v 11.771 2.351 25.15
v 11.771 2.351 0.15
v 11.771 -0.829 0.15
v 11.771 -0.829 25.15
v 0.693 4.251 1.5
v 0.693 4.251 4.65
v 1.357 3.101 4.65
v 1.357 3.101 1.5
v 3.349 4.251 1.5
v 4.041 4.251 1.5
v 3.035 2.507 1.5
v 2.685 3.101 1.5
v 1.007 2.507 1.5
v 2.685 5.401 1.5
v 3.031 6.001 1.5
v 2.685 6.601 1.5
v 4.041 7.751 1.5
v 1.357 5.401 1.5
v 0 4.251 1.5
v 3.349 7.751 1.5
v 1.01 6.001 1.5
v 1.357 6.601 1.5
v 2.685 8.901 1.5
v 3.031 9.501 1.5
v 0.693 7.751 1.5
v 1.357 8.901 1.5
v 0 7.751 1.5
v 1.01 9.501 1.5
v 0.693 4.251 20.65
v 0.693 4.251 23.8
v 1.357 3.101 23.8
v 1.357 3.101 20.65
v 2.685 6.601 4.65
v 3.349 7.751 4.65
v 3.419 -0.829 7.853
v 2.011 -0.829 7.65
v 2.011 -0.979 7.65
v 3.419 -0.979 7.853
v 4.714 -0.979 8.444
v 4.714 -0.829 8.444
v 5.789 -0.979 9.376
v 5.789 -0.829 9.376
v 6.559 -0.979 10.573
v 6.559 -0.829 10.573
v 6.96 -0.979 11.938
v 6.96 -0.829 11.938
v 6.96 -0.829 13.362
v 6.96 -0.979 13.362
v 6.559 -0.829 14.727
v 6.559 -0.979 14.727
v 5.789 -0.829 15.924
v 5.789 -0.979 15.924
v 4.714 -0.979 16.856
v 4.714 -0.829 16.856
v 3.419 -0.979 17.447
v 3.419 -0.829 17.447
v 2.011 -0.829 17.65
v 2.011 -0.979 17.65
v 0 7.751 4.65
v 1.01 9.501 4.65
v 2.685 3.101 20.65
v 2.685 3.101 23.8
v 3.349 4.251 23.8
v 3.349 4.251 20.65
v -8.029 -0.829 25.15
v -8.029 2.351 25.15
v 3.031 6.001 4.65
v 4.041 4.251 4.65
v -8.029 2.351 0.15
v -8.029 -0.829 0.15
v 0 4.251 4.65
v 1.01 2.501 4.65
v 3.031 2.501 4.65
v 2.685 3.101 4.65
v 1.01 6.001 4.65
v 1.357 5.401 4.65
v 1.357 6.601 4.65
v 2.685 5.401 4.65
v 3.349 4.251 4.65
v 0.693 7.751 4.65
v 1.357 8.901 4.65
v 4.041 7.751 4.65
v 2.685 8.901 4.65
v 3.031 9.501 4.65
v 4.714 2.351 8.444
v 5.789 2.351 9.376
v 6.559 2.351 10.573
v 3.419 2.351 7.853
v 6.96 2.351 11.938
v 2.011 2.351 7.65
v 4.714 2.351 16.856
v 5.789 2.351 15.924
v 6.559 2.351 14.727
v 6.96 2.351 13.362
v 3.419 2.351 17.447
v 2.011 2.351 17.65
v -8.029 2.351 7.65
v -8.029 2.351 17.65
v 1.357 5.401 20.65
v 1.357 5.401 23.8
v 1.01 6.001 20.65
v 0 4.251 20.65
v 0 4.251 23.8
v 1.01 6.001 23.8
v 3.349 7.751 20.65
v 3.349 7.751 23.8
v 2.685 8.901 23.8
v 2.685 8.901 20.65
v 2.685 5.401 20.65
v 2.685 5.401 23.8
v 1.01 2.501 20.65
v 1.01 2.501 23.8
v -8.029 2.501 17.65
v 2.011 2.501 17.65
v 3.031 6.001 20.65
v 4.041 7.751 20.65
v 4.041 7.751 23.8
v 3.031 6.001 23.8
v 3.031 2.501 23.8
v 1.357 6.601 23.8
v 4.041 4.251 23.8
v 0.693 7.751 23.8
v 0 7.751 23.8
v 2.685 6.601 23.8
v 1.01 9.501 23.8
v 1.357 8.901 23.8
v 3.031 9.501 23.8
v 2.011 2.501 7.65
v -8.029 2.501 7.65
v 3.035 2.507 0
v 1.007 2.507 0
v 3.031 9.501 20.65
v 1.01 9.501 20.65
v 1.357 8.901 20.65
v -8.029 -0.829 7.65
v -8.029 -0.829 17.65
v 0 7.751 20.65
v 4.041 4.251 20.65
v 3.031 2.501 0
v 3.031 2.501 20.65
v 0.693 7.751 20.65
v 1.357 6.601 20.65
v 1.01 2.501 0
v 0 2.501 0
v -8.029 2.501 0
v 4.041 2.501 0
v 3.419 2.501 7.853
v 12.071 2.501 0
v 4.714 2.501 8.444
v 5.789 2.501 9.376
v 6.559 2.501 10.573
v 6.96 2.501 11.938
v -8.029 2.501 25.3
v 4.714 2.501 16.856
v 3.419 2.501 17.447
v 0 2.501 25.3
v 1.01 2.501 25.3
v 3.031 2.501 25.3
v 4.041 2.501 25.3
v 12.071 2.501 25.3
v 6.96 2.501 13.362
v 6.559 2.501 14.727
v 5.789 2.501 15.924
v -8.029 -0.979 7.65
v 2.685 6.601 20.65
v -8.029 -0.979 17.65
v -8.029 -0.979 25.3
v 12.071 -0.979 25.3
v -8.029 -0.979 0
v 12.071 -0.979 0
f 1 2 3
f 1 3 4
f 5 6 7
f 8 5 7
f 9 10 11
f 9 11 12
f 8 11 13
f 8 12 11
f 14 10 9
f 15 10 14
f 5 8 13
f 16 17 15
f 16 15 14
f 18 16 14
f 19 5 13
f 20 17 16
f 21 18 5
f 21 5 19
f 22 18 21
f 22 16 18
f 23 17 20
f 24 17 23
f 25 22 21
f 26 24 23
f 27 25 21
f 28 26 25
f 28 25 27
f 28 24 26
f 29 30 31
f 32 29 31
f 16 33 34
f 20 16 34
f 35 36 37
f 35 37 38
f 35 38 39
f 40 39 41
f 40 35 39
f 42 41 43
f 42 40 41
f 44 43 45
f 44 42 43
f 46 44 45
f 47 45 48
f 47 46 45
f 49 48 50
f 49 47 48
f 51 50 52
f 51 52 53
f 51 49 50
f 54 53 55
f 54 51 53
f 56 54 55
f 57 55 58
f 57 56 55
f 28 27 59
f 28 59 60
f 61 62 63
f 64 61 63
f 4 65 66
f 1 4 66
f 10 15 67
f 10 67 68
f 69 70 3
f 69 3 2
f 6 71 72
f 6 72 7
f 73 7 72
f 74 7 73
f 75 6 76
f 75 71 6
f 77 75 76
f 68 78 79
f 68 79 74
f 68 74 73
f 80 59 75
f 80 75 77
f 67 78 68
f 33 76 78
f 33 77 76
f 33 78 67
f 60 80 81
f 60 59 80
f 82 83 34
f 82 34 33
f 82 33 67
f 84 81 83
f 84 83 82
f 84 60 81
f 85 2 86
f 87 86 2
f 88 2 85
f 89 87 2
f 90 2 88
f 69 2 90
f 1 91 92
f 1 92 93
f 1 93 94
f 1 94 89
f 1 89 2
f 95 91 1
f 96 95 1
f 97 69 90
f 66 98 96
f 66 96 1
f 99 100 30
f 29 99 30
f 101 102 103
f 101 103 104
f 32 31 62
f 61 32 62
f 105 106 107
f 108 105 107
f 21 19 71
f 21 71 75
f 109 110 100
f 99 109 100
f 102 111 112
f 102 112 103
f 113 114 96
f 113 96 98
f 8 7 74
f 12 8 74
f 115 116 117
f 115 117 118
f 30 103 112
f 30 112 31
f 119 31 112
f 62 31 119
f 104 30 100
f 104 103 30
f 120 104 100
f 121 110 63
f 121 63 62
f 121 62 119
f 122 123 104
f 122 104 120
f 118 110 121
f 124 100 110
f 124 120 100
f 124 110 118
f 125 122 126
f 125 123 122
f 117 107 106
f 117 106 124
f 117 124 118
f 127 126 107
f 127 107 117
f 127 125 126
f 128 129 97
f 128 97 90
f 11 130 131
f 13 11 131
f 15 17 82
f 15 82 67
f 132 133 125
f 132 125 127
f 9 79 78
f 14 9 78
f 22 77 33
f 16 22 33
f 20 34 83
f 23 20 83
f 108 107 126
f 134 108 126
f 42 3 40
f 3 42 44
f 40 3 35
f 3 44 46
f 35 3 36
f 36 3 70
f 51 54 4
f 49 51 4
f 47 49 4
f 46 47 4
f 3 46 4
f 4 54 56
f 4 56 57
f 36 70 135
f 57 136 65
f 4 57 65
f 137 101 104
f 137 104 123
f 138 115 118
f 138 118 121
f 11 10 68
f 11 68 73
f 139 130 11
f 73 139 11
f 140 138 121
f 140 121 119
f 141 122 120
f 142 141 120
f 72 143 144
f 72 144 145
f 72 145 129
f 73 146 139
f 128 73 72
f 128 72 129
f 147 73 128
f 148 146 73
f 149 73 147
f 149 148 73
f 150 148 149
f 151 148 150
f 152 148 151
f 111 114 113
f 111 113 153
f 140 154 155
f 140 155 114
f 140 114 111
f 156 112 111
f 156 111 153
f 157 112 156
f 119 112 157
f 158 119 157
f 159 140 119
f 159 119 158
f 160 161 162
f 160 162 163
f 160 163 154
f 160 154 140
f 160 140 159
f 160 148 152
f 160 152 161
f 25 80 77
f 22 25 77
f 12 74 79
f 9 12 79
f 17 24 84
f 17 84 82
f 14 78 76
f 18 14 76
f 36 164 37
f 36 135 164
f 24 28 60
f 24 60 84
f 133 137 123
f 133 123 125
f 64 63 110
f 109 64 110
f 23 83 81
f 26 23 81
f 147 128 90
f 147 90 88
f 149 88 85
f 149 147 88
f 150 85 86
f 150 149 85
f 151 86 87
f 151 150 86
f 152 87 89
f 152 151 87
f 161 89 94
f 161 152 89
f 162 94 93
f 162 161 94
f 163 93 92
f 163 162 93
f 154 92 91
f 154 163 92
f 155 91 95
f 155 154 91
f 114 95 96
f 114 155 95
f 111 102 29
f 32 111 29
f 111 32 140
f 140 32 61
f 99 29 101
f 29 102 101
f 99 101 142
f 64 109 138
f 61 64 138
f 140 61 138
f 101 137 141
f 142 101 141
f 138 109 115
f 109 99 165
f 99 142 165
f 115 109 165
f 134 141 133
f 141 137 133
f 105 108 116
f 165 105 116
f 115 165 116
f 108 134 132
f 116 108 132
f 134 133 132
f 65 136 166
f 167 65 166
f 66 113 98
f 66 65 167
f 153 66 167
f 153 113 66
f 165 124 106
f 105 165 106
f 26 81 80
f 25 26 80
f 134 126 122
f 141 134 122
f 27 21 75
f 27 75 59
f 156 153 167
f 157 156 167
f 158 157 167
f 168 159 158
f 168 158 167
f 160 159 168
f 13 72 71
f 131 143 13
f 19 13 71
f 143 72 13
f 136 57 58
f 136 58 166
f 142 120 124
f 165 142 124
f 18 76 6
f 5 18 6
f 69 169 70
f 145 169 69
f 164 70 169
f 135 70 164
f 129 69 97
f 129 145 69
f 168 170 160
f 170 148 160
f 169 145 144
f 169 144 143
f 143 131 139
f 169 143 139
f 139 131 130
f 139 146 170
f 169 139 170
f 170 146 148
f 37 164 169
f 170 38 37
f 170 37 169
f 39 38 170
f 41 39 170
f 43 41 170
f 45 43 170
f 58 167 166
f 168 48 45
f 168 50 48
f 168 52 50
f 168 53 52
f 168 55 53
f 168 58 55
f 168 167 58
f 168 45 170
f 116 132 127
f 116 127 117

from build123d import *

# Parameters (mm, degrees)
BOSS_EXTRUDE1_DEPTH = 25.3
CUT_EXTRUDE1_DEPTH  = 25.3
SKETCH14_W          = 4.475703298
SKETCH14_H          = 7.178850836
CUT_EXTRUDE6_DEPTH  = 1.5
SKETCH15_W          = 4.041452
SKETCH15_H          = 7.107257799
CUT_EXTRUDE7_DEPTH  = 1.5
SKETCH16_W          = 5.309940562
SKETCH16_H          = 16
CUT_EXTRUDE8_DEPTH  = 7
SKETCH17_W          = 25.3
SKETCH17_H          = 2.501305671
BOSS_EXTRUDE2_DEPTH = 8.029274
SKETCH18_W          = 25.3
SKETCH18_H          = 2.501305671
BOSS_EXTRUDE3_DEPTH = 8.029274
SKETCH20_W          = 20.1
SKETCH20_H          = 25.3
BOSS_EXTRUDE4_DEPTH = 0.978694
CUT_EXTRUDE9_DEPTH  = 3.48
SKETCH22_W          = 25
SKETCH22_H          = 3.18
CUT_EXTRUDE10_DEPTH = 19.8


with BuildPart() as part:
    # Sketch2 → Boss-Extrude1 (new body)
    with BuildSketch(Plane.XY):
        Polygon((3.031088942, 2.501305671), (4.041452, 2.501305671), (4.041452, 0), (0, 0), (0, 2.501305671), (1.010363, 2.501305671), (2.9e-08, 4.251305671), (1.010363, 6.001305671), (2.9e-08, 7.751305671), (1.010363, 9.501305671), (3.031088942, 9.501305671), (4.041451913, 7.751305671), (3.031088942, 6.001305671), (4.041451913, 4.251305671), align=None)
    extrude(amount=BOSS_EXTRUDE1_DEPTH)

    # Sketch3 → Cut-Extrude1 (cut)
    with BuildSketch(Plane.XY.offset(25.3)):
        Polygon((3.34863159, 7.751305671), (2.684678781, 8.901305671), (1.356773162, 8.901305671), (0.692820352, 7.751305671), (1.356773162, 6.601305671), (2.684678781, 6.601305671), align=None)
        Polygon((3.34863159, 4.251305671), (2.684678781, 5.401305671), (1.356773162, 5.401305671), (0.692820352, 4.251305671), (1.356773162, 3.101305671), (2.684678781, 3.101305671), align=None)
    extrude(amount=-CUT_EXTRUDE1_DEPTH, mode=Mode.SUBTRACT)

    # Sketch14 → Cut-Extrude6 (cut)
    with BuildSketch(Plane(origin=(0, 0, 0), x_dir=(-1, 0, 0), z_dir=(0, 0, -1))):
        with Locations((-1.998569053, 6.096687367)):
            Rectangle(SKETCH14_W, SKETCH14_H)
    extrude(amount=-CUT_EXTRUDE6_DEPTH, mode=Mode.SUBTRACT)

    # Sketch15 → Cut-Extrude7 (cut)
    with BuildSketch(Plane.XY.offset(25.3)):
        with Locations((2.020726, 6.054934571)):
            Rectangle(SKETCH15_W, SKETCH15_H)
    extrude(amount=-CUT_EXTRUDE7_DEPTH, mode=Mode.SUBTRACT)

    # Sketch16 → Cut-Extrude8 (cut)
    with BuildSketch(Plane(origin=(0, 9.501305671, 0), x_dir=(1, 0, 0), z_dir=(0, 1, 0))):
        with Locations((1.902727321, -12.65)):
            Rectangle(SKETCH16_W, SKETCH16_H)
    extrude(amount=-CUT_EXTRUDE8_DEPTH, mode=Mode.SUBTRACT)

    # Sketch17 → Boss-Extrude2 (add)
    with BuildSketch(Plane(origin=(4.041452, 0, 0), x_dir=(0, 0, -1), z_dir=(1, 0, 0))):
        with Locations((-12.65, 1.250652836)):
            Rectangle(SKETCH17_W, SKETCH17_H)
    extrude(amount=BOSS_EXTRUDE2_DEPTH)

    # Sketch18 → Boss-Extrude3 (add)
    with BuildSketch(Plane.ZY):
        with Locations((12.65, 1.250652836)):
            Rectangle(SKETCH18_W, SKETCH18_H)
    extrude(amount=BOSS_EXTRUDE3_DEPTH)

    # Sketch20 → Boss-Extrude4 (add)
    with BuildSketch(Plane.XZ):
        with Locations((2.020726, 12.65)):
            Rectangle(SKETCH20_W, SKETCH20_H)
    extrude(amount=BOSS_EXTRUDE4_DEPTH)

    # Sketch21 → Cut-Extrude9 (cut)
    with BuildSketch(Plane(origin=(0, 2.501305671, 0), x_dir=(1, 0, 0), z_dir=(0, 1, 0))):
        with BuildLine():
            Line((-8.029274, -7.65), (2.010726, -7.65))
            ThreePointArc((2.010726, -7.65), (7.010726, -12.65), (2.010726, -17.65))
            Line((2.010726, -17.65), (-8.029274, -17.65))
            Line((-8.029274, -17.65), (-8.029274, -7.65))
        make_face()
    extrude(amount=-CUT_EXTRUDE9_DEPTH, mode=Mode.SUBTRACT)

    # Sketch22 → Cut-Extrude10 (cut)
    with BuildSketch(Plane.ZY.offset(8.029274)):
        with Locations((12.65, 0.761305671)):
            Rectangle(SKETCH22_W, SKETCH22_H)
    extrude(amount=-CUT_EXTRUDE10_DEPTH, mode=Mode.SUBTRACT)


solid = part.part
